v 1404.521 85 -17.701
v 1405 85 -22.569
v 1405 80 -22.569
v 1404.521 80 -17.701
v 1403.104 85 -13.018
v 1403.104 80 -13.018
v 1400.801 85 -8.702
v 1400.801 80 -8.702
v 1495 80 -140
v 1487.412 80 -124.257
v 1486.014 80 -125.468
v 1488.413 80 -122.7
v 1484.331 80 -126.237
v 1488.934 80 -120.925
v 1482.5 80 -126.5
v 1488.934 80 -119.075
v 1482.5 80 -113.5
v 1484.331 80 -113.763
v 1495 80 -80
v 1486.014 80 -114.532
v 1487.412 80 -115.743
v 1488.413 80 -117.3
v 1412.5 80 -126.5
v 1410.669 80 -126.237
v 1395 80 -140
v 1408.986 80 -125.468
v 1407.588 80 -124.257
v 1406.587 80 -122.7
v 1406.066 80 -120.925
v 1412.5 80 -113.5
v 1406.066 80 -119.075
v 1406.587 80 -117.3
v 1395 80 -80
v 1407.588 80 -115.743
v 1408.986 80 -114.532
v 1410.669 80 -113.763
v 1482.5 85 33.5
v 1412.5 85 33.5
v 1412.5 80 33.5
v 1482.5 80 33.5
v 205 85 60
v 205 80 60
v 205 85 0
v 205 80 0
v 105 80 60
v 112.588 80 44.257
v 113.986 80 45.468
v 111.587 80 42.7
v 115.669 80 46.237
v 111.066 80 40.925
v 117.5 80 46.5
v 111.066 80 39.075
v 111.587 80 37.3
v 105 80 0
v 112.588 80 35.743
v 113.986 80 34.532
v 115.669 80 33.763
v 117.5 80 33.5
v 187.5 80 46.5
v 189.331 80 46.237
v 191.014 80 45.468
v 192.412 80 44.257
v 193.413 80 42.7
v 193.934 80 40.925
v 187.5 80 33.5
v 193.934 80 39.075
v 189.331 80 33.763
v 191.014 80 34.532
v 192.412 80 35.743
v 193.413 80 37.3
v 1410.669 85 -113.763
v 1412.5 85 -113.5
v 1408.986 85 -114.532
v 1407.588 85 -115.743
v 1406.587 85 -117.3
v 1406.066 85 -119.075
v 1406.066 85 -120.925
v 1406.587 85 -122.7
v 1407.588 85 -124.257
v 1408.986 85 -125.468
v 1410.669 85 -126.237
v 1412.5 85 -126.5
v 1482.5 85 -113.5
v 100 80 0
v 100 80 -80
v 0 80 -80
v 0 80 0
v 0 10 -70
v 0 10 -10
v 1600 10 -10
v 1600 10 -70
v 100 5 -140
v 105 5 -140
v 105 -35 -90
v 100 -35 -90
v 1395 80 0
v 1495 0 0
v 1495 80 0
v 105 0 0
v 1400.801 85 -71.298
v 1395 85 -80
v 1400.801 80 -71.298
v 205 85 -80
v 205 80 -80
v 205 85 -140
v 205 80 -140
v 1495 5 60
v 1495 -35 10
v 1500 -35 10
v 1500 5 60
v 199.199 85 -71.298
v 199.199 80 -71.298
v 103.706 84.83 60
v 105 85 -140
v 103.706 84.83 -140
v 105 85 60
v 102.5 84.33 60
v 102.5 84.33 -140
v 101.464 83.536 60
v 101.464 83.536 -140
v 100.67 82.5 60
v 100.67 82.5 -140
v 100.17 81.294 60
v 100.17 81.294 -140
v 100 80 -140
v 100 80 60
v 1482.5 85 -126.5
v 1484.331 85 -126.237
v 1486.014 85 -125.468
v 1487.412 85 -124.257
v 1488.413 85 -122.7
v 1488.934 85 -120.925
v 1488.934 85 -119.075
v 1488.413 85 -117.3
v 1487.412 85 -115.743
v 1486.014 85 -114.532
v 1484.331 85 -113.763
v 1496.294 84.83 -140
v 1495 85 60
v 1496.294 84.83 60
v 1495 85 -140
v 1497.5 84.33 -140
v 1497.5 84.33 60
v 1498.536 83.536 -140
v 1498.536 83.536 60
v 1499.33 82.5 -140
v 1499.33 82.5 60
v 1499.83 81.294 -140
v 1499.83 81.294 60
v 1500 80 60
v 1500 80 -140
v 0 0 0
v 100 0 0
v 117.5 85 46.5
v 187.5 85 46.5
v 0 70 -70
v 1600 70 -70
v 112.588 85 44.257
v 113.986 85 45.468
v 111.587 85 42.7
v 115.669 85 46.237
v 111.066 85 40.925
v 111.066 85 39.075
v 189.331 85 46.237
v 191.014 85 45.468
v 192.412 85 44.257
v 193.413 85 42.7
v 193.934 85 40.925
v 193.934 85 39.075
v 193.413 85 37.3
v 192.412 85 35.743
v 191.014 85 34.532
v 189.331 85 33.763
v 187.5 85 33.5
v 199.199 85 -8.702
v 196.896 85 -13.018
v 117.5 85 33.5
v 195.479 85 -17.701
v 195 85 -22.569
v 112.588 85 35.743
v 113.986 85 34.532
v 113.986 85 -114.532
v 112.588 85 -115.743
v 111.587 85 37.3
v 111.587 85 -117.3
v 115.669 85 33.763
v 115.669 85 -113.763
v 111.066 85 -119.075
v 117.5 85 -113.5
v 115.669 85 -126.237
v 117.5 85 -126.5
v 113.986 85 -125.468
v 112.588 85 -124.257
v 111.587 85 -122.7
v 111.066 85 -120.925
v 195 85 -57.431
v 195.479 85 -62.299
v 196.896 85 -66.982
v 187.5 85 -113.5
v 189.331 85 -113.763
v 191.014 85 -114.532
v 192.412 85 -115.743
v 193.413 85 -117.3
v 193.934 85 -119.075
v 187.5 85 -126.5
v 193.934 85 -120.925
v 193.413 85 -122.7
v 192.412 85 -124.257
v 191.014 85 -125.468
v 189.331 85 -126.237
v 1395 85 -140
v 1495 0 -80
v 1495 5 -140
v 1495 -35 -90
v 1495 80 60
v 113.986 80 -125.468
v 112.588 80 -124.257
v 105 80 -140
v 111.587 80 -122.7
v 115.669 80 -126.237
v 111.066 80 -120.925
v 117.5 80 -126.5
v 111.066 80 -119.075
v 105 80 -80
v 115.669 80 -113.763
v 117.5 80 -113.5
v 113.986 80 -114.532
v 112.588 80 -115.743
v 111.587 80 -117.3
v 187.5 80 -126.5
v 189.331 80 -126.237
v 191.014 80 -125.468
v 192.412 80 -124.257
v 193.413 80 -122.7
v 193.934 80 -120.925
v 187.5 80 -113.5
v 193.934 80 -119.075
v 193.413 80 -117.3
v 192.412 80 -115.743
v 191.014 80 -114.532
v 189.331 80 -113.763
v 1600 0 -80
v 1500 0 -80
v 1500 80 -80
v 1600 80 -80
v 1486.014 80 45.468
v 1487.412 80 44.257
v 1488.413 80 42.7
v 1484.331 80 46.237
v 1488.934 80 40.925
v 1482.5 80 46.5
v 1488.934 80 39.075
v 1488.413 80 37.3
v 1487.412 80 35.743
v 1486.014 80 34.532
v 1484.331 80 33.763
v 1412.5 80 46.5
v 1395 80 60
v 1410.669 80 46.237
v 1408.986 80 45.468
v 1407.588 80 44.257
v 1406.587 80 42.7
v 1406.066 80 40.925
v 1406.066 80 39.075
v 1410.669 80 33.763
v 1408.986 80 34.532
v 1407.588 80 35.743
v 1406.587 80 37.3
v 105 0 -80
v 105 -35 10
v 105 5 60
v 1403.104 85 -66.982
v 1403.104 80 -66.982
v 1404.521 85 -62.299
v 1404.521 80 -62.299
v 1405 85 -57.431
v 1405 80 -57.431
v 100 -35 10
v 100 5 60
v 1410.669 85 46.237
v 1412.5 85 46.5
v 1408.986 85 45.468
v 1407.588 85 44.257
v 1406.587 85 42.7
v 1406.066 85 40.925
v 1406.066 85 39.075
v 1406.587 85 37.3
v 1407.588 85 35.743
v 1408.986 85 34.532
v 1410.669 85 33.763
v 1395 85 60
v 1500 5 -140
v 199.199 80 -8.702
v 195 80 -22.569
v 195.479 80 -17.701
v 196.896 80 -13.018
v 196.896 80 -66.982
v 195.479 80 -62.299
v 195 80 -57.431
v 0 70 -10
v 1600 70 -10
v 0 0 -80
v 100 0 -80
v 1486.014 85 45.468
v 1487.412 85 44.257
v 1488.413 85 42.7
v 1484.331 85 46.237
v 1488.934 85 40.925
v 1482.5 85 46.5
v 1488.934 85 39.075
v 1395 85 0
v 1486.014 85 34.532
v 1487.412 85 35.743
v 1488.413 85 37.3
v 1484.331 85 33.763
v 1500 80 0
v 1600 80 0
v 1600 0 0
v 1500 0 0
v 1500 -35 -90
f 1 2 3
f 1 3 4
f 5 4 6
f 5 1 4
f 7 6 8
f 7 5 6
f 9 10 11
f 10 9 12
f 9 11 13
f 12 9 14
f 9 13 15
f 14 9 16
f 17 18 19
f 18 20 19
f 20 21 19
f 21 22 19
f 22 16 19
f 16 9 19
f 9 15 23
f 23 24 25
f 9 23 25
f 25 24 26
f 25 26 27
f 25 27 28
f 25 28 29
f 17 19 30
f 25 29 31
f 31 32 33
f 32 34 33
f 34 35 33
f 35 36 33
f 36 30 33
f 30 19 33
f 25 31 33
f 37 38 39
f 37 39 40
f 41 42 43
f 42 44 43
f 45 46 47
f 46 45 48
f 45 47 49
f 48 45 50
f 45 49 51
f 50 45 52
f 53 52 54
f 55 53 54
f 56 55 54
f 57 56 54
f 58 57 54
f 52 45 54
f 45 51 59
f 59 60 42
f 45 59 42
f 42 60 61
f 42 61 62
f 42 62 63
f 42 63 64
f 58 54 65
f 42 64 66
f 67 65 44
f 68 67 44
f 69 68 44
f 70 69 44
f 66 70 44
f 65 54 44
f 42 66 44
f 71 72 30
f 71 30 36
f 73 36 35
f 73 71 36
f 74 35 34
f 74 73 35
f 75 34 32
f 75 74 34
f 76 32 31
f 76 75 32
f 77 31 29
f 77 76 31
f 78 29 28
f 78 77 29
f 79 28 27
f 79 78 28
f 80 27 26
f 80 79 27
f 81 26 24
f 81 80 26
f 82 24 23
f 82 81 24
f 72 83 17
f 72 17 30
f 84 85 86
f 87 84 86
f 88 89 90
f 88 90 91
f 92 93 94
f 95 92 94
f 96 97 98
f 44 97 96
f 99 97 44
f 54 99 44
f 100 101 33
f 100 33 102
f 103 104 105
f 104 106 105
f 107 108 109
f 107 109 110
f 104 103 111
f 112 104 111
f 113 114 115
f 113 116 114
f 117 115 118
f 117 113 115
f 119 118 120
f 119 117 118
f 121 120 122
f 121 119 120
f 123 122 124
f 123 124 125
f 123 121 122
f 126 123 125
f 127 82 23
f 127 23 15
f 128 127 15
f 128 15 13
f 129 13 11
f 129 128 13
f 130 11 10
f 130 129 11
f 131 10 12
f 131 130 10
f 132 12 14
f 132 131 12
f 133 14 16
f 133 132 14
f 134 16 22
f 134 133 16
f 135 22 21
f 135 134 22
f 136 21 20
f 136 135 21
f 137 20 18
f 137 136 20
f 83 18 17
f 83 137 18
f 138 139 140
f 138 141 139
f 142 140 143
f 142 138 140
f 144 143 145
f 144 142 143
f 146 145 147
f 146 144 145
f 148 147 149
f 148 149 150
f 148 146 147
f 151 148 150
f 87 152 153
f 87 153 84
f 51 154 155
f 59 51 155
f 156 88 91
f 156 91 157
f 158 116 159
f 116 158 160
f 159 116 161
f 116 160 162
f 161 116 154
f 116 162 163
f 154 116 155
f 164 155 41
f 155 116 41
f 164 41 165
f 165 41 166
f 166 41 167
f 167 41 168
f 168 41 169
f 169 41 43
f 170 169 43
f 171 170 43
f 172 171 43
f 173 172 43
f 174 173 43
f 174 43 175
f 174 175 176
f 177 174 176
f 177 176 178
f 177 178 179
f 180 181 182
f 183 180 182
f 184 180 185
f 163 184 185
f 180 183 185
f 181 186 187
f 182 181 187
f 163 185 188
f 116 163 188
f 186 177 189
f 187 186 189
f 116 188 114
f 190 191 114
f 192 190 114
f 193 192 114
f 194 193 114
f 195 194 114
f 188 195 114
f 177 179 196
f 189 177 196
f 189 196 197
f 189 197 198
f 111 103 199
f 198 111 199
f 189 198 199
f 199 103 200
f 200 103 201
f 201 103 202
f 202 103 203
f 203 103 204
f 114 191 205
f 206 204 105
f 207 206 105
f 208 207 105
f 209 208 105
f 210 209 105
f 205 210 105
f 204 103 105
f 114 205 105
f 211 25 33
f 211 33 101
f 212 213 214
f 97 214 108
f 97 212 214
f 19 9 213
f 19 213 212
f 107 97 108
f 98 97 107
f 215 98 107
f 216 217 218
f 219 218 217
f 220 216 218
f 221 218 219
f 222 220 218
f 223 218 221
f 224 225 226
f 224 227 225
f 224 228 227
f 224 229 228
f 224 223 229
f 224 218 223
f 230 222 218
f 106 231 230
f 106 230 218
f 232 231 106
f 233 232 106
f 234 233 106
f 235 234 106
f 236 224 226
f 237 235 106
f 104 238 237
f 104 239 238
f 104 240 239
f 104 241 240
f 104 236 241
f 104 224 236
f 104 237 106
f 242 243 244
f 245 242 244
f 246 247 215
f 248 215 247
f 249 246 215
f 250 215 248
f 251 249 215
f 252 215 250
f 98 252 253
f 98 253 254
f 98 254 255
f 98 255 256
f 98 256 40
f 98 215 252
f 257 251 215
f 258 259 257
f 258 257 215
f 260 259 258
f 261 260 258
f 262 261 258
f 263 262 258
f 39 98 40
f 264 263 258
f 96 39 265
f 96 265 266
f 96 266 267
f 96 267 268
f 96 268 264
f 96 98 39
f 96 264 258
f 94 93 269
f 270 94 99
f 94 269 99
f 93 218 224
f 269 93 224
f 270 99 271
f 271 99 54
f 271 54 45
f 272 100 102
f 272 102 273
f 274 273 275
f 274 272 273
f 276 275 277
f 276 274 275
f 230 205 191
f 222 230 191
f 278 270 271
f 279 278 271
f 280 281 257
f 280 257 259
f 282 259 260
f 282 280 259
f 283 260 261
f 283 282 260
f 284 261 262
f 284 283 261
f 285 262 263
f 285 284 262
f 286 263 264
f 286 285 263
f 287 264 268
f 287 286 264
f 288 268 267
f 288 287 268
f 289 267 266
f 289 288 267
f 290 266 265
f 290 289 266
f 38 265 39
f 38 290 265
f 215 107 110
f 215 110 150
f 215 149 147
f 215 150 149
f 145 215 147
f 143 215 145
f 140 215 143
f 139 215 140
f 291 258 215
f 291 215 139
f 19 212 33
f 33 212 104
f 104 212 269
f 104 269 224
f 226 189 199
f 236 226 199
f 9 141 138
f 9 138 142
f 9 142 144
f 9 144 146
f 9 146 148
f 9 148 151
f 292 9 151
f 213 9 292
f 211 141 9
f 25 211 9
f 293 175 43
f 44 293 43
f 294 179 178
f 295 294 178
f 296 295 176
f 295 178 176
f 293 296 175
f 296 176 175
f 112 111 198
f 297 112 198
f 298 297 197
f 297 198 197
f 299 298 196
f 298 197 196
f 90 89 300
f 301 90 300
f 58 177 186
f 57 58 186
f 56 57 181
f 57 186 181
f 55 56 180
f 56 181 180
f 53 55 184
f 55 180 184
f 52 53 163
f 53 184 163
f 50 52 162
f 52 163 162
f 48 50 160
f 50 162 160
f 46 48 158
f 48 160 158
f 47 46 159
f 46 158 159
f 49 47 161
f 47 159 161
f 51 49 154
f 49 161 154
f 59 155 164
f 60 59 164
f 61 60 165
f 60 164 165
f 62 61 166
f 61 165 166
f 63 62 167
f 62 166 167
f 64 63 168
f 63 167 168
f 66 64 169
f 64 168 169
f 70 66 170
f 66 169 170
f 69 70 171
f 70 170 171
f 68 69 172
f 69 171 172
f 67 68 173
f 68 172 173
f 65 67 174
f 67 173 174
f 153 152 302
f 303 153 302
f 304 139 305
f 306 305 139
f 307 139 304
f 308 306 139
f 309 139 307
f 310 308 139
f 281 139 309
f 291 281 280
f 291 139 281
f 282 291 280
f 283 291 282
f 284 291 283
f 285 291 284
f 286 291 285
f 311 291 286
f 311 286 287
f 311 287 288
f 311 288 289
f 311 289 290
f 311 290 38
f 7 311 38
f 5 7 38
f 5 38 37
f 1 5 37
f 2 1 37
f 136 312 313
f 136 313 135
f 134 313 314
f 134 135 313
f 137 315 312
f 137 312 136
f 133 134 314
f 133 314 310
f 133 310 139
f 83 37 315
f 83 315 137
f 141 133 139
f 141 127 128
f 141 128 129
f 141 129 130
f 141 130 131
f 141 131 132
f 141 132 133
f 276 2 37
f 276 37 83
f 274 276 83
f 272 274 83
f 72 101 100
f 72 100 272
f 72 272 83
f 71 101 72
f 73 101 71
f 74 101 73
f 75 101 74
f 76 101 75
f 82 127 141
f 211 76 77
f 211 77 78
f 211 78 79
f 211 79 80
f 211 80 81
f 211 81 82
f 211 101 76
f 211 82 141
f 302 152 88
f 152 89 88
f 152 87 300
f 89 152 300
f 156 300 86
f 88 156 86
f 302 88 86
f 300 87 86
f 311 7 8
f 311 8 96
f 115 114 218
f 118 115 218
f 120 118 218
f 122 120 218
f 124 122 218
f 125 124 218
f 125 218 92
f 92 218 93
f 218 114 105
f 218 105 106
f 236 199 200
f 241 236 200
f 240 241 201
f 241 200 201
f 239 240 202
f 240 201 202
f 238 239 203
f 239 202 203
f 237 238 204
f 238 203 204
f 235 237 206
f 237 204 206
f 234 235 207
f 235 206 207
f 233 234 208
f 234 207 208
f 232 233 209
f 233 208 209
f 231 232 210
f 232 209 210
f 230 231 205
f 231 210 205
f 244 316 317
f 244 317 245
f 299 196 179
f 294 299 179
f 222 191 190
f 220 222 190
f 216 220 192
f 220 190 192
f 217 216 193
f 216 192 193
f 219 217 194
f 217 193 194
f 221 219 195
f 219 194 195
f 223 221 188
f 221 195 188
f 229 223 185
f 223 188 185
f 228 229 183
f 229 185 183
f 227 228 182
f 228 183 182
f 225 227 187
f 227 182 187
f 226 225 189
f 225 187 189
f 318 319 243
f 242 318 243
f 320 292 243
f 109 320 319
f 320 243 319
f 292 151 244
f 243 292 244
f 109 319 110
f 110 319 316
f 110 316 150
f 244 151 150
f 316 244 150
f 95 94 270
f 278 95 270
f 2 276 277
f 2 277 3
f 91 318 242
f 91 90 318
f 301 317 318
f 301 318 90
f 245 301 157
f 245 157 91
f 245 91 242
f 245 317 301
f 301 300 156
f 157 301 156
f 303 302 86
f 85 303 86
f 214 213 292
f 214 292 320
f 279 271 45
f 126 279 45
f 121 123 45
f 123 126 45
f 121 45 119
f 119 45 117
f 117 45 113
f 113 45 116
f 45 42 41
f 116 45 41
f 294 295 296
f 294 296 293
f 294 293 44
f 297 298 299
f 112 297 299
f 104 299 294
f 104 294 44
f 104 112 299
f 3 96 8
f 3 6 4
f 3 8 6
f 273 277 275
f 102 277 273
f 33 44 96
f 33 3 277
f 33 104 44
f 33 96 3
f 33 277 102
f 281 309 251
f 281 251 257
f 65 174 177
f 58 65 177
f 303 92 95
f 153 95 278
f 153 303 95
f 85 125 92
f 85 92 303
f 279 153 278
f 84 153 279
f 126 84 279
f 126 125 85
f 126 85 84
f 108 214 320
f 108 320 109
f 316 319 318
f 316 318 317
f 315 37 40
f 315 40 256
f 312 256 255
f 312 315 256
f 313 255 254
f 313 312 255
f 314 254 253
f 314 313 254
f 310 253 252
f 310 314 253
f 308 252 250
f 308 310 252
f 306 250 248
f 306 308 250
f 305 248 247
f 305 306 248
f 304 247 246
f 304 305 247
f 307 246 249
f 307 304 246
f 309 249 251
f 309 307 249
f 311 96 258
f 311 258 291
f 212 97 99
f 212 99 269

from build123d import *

# Parameters (mm, degrees)
SKETCH3_W                       = 80
SKETCH3_H                       = 80
SKETCH3_W_2                     = 60
SKETCH3_H_2                     = 60
BOSS_EXTRUDE2_DEPTH             = 1600
SKETCH7_W                       = 60
SKETCH7_H                       = 60
BOSS_EXTRUDE3_DEPTH             = 5
BOSS_EXTRUDE4_REACH             = 1610.361
SKETCH8_W                       = 105
SKETCH8_H                       = 5
BOSS_EXTRUDE4_DIRECTION_2_REACH = 1610.361
CUT_EXTRUDE1_DEPTH              = 5
CUT_EXTRUDE2_REACH              = 1612.59
FILLET1_R                       = 5
FILLET1_OF_MIRROR1_R            = 5
FILLET1_OF_MIRROR2_R            = 5


with BuildPart() as part:
    # Sketch3 → Boss-Extrude2 (new body)
    with BuildSketch(Plane(origin=(0, 0, 0), x_dir=(0, 0, -1), z_dir=(1, 0, 0))):
        with Locations((40, 40)):
            Rectangle(SKETCH3_W, SKETCH3_H)
        with Locations((40, 40)):
            Rectangle(SKETCH3_W_2, SKETCH3_H_2, mode=Mode.SUBTRACT)
    extrude(amount=BOSS_EXTRUDE2_DEPTH)

    # Sketch7 → Boss-Extrude3 (add)
    with BuildSketch(Plane(origin=(1495, 0, 0), x_dir=(0, 0, -1), z_dir=(1, 0, 0))):
        Polygon((-60, 85), (140, 85), (140, 5), (90, -35), (-10, -35), (-60, 5), align=None)
        with Locations((40, 40)):
            Rectangle(SKETCH7_W, SKETCH7_H, mode=Mode.SUBTRACT)
    boss_extrude3 = extrude(amount=BOSS_EXTRUDE3_DEPTH)

    # Boss-Extrude4: up to this face of the body (flat: up to its plane)
    boss_extrude4_end = Plane(part.part.faces().sort_by_distance((1497.5, 45, -140))[0])
    # Sketch8 → Boss-Extrude4 (add, up to the picked face)
    with BuildSketch(Plane(origin=(0, 0, -80), x_dir=(-1, 0, 0), z_dir=(0, 0, -1)), mode=Mode.PRIVATE) as boss_extrude4_sk1:
        with Locations((-1447.5, 82.5)):
            Rectangle(SKETCH8_W, SKETCH8_H)
    boss_extrude4_tool1 = split(extrude(boss_extrude4_sk1.sketch, amount=BOSS_EXTRUDE4_REACH, mode=Mode.PRIVATE), bisect_by=boss_extrude4_end, keep=Keep.BOTH, mode=Mode.PRIVATE)
    boss_extrude4 = boss_extrude4_tool1.solids().sort_by(Axis((1447.5, 82.5, -80), (0, 0, -1)))[0]
    add(boss_extrude4)

    # Boss-Extrude4 direction 2: up to this face of the body (flat: up to its plane)
    boss_extrude4_direction_2_end = Plane(part.part.faces().sort_by_distance((1497.5, 45, 60))[0])
    # Sketch8 → Boss-Extrude4 direction 2 (add, up to the picked face)
    with BuildSketch(Plane(origin=(0, 0, -80), x_dir=(-1, 0, 0), z_dir=(0, 0, -1)), mode=Mode.PRIVATE) as boss_extrude4_direction_2_sk1:
        with Locations((-1447.5, 82.5)):
            Rectangle(SKETCH8_W, SKETCH8_H)
    boss_extrude4_direction_2_tool1 = split(extrude(boss_extrude4_direction_2_sk1.sketch, amount=-BOSS_EXTRUDE4_DIRECTION_2_REACH, mode=Mode.PRIVATE), bisect_by=boss_extrude4_direction_2_end, keep=Keep.BOTH, mode=Mode.PRIVATE)
    boss_extrude4_direction_2 = boss_extrude4_direction_2_tool1.solids().sort_by(Axis((1447.5, 82.5, -80), (0, 0, 1)))[0]
    add(boss_extrude4_direction_2)

    # Sketch9 → Cut-Extrude1 (cut)
    with BuildSketch(Plane(origin=(0, 85, 0), x_dir=(1, 0, 0), z_dir=(0, 1, 0))):
        with BuildLine():
            Line((1395, 80), (1400.801257358, 71.298113962))
            ThreePointArc((1400.801257358, 71.298113962), (1403.927300662, 64.675212774), (1405, 57.430609057))
            Line((1405, 57.430609057), (1405, 22.569390943))
            ThreePointArc((1405, 22.569390943), (1403.927300662, 15.324787226), (1400.801257358, 8.701886038))
            Line((1400.801257358, 8.701886038), (1395, 0))
            Line((1395, 0), (1395, 80))
        make_face()
    cut_extrude1 = extrude(amount=-CUT_EXTRUDE1_DEPTH, mode=Mode.SUBTRACT)

    # Sketch10 → Cut-Extrude2 (cut, up to next)
    with BuildSketch(Plane(origin=(0, 85, 0), x_dir=(1, 0, 0), z_dir=(0, 1, 0)), mode=Mode.PRIVATE) as cut_extrude2_sk1:
        with BuildLine():
            Line((1412.5, 126.5), (1482.5, 126.5))
            ThreePointArc((1482.5, 126.5), (1489, 120), (1482.5, 113.5))
            Line((1482.5, 113.5), (1412.5, 113.5))
            ThreePointArc((1412.5, 113.5), (1406, 120), (1412.5, 126.5))
        make_face()
    cut_extrude2_tool1 = extrude(cut_extrude2_sk1.sketch, amount=-CUT_EXTRUDE2_REACH, mode=Mode.PRIVATE) & part.part
    # Sketch10 → Cut-Extrude2 (cut, up to next)
    with BuildSketch(Plane(origin=(0, 85, 0), x_dir=(1, 0, 0), z_dir=(0, 1, 0)), mode=Mode.PRIVATE) as cut_extrude2_sk2:
        with BuildLine():
            Line((1412.5, -33.5), (1482.5, -33.5))
            ThreePointArc((1482.5, -33.5), (1489, -40), (1482.5, -46.5))
            Line((1482.5, -46.5), (1412.5, -46.5))
            ThreePointArc((1412.5, -46.5), (1406, -40), (1412.5, -33.5))
        make_face()
    cut_extrude2_tool2 = extrude(cut_extrude2_sk2.sketch, amount=-CUT_EXTRUDE2_REACH, mode=Mode.PRIVATE) & part.part
    cut_extrude2_1 = cut_extrude2_tool1.solids().sort_by_distance((1447.5, 85, -120))[0]
    add(cut_extrude2_1, mode=Mode.SUBTRACT)
    cut_extrude2_2 = cut_extrude2_tool2.solids().sort_by_distance((1447.5, 85, 40))[0]
    add(cut_extrude2_2, mode=Mode.SUBTRACT)
    cut_extrude2 = cut_extrude2_1 + cut_extrude2_2  # Cut-Extrude2 as one shape, for the pattern or mirror that repeats it

    # Fillet1
    fillet1_edges = [part.edges().sort_by_distance(p)[0] for p in [
        (1500, 85, -40),
    ]]
    fillet(fillet1_edges, radius=FILLET1_R - 0.0001)  # a hair under: the kernel refuses the full size

    # Mirror1: Boss-Extrude3 across plane
    add(boss_extrude3.mirror(Plane(origin=(800, 0, 0), x_dir=(0, 0, 1), z_dir=(1, 0, 0))))

    # Fillet1 of Mirror1
    fillet1_of_mirror1_edges = [part.edges().sort_by_distance(p)[0] for p in [
        (100, 85, -40),
    ]]
    fillet(fillet1_of_mirror1_edges, radius=FILLET1_OF_MIRROR1_R - 0.0001)  # a hair under: the kernel refuses the full size

    # Mirror2: Boss-Extrude3, Boss-Extrude4, Boss-Extrude4 direction 2, Cut-Extrude1, Cut-Extrude2 across plane
    add(boss_extrude3.mirror(Plane(origin=(800, 0, 0), x_dir=(0, 0, 1), z_dir=(1, 0, 0))))
    add(boss_extrude4.mirror(Plane(origin=(800, 0, 0), x_dir=(0, 0, 1), z_dir=(1, 0, 0))))
    add(boss_extrude4_direction_2.mirror(Plane(origin=(800, 0, 0), x_dir=(0, 0, 1), z_dir=(1, 0, 0))))
    add(cut_extrude1.mirror(Plane(origin=(800, 0, 0), x_dir=(0, 0, 1), z_dir=(1, 0, 0))), mode=Mode.SUBTRACT)
    add(cut_extrude2.mirror(Plane(origin=(800, 0, 0), x_dir=(0, 0, 1), z_dir=(1, 0, 0))), mode=Mode.SUBTRACT)

    # Fillet1 of Mirror2
    fillet1_of_mirror2_edges = [part.edges().sort_by_distance(p)[0] for p in [
        (100, 85, -40),
    ]]
    fillet(fillet1_of_mirror2_edges, radius=FILLET1_OF_MIRROR2_R - 0.0001)  # a hair under: the kernel refuses the full size


solid = part.part
